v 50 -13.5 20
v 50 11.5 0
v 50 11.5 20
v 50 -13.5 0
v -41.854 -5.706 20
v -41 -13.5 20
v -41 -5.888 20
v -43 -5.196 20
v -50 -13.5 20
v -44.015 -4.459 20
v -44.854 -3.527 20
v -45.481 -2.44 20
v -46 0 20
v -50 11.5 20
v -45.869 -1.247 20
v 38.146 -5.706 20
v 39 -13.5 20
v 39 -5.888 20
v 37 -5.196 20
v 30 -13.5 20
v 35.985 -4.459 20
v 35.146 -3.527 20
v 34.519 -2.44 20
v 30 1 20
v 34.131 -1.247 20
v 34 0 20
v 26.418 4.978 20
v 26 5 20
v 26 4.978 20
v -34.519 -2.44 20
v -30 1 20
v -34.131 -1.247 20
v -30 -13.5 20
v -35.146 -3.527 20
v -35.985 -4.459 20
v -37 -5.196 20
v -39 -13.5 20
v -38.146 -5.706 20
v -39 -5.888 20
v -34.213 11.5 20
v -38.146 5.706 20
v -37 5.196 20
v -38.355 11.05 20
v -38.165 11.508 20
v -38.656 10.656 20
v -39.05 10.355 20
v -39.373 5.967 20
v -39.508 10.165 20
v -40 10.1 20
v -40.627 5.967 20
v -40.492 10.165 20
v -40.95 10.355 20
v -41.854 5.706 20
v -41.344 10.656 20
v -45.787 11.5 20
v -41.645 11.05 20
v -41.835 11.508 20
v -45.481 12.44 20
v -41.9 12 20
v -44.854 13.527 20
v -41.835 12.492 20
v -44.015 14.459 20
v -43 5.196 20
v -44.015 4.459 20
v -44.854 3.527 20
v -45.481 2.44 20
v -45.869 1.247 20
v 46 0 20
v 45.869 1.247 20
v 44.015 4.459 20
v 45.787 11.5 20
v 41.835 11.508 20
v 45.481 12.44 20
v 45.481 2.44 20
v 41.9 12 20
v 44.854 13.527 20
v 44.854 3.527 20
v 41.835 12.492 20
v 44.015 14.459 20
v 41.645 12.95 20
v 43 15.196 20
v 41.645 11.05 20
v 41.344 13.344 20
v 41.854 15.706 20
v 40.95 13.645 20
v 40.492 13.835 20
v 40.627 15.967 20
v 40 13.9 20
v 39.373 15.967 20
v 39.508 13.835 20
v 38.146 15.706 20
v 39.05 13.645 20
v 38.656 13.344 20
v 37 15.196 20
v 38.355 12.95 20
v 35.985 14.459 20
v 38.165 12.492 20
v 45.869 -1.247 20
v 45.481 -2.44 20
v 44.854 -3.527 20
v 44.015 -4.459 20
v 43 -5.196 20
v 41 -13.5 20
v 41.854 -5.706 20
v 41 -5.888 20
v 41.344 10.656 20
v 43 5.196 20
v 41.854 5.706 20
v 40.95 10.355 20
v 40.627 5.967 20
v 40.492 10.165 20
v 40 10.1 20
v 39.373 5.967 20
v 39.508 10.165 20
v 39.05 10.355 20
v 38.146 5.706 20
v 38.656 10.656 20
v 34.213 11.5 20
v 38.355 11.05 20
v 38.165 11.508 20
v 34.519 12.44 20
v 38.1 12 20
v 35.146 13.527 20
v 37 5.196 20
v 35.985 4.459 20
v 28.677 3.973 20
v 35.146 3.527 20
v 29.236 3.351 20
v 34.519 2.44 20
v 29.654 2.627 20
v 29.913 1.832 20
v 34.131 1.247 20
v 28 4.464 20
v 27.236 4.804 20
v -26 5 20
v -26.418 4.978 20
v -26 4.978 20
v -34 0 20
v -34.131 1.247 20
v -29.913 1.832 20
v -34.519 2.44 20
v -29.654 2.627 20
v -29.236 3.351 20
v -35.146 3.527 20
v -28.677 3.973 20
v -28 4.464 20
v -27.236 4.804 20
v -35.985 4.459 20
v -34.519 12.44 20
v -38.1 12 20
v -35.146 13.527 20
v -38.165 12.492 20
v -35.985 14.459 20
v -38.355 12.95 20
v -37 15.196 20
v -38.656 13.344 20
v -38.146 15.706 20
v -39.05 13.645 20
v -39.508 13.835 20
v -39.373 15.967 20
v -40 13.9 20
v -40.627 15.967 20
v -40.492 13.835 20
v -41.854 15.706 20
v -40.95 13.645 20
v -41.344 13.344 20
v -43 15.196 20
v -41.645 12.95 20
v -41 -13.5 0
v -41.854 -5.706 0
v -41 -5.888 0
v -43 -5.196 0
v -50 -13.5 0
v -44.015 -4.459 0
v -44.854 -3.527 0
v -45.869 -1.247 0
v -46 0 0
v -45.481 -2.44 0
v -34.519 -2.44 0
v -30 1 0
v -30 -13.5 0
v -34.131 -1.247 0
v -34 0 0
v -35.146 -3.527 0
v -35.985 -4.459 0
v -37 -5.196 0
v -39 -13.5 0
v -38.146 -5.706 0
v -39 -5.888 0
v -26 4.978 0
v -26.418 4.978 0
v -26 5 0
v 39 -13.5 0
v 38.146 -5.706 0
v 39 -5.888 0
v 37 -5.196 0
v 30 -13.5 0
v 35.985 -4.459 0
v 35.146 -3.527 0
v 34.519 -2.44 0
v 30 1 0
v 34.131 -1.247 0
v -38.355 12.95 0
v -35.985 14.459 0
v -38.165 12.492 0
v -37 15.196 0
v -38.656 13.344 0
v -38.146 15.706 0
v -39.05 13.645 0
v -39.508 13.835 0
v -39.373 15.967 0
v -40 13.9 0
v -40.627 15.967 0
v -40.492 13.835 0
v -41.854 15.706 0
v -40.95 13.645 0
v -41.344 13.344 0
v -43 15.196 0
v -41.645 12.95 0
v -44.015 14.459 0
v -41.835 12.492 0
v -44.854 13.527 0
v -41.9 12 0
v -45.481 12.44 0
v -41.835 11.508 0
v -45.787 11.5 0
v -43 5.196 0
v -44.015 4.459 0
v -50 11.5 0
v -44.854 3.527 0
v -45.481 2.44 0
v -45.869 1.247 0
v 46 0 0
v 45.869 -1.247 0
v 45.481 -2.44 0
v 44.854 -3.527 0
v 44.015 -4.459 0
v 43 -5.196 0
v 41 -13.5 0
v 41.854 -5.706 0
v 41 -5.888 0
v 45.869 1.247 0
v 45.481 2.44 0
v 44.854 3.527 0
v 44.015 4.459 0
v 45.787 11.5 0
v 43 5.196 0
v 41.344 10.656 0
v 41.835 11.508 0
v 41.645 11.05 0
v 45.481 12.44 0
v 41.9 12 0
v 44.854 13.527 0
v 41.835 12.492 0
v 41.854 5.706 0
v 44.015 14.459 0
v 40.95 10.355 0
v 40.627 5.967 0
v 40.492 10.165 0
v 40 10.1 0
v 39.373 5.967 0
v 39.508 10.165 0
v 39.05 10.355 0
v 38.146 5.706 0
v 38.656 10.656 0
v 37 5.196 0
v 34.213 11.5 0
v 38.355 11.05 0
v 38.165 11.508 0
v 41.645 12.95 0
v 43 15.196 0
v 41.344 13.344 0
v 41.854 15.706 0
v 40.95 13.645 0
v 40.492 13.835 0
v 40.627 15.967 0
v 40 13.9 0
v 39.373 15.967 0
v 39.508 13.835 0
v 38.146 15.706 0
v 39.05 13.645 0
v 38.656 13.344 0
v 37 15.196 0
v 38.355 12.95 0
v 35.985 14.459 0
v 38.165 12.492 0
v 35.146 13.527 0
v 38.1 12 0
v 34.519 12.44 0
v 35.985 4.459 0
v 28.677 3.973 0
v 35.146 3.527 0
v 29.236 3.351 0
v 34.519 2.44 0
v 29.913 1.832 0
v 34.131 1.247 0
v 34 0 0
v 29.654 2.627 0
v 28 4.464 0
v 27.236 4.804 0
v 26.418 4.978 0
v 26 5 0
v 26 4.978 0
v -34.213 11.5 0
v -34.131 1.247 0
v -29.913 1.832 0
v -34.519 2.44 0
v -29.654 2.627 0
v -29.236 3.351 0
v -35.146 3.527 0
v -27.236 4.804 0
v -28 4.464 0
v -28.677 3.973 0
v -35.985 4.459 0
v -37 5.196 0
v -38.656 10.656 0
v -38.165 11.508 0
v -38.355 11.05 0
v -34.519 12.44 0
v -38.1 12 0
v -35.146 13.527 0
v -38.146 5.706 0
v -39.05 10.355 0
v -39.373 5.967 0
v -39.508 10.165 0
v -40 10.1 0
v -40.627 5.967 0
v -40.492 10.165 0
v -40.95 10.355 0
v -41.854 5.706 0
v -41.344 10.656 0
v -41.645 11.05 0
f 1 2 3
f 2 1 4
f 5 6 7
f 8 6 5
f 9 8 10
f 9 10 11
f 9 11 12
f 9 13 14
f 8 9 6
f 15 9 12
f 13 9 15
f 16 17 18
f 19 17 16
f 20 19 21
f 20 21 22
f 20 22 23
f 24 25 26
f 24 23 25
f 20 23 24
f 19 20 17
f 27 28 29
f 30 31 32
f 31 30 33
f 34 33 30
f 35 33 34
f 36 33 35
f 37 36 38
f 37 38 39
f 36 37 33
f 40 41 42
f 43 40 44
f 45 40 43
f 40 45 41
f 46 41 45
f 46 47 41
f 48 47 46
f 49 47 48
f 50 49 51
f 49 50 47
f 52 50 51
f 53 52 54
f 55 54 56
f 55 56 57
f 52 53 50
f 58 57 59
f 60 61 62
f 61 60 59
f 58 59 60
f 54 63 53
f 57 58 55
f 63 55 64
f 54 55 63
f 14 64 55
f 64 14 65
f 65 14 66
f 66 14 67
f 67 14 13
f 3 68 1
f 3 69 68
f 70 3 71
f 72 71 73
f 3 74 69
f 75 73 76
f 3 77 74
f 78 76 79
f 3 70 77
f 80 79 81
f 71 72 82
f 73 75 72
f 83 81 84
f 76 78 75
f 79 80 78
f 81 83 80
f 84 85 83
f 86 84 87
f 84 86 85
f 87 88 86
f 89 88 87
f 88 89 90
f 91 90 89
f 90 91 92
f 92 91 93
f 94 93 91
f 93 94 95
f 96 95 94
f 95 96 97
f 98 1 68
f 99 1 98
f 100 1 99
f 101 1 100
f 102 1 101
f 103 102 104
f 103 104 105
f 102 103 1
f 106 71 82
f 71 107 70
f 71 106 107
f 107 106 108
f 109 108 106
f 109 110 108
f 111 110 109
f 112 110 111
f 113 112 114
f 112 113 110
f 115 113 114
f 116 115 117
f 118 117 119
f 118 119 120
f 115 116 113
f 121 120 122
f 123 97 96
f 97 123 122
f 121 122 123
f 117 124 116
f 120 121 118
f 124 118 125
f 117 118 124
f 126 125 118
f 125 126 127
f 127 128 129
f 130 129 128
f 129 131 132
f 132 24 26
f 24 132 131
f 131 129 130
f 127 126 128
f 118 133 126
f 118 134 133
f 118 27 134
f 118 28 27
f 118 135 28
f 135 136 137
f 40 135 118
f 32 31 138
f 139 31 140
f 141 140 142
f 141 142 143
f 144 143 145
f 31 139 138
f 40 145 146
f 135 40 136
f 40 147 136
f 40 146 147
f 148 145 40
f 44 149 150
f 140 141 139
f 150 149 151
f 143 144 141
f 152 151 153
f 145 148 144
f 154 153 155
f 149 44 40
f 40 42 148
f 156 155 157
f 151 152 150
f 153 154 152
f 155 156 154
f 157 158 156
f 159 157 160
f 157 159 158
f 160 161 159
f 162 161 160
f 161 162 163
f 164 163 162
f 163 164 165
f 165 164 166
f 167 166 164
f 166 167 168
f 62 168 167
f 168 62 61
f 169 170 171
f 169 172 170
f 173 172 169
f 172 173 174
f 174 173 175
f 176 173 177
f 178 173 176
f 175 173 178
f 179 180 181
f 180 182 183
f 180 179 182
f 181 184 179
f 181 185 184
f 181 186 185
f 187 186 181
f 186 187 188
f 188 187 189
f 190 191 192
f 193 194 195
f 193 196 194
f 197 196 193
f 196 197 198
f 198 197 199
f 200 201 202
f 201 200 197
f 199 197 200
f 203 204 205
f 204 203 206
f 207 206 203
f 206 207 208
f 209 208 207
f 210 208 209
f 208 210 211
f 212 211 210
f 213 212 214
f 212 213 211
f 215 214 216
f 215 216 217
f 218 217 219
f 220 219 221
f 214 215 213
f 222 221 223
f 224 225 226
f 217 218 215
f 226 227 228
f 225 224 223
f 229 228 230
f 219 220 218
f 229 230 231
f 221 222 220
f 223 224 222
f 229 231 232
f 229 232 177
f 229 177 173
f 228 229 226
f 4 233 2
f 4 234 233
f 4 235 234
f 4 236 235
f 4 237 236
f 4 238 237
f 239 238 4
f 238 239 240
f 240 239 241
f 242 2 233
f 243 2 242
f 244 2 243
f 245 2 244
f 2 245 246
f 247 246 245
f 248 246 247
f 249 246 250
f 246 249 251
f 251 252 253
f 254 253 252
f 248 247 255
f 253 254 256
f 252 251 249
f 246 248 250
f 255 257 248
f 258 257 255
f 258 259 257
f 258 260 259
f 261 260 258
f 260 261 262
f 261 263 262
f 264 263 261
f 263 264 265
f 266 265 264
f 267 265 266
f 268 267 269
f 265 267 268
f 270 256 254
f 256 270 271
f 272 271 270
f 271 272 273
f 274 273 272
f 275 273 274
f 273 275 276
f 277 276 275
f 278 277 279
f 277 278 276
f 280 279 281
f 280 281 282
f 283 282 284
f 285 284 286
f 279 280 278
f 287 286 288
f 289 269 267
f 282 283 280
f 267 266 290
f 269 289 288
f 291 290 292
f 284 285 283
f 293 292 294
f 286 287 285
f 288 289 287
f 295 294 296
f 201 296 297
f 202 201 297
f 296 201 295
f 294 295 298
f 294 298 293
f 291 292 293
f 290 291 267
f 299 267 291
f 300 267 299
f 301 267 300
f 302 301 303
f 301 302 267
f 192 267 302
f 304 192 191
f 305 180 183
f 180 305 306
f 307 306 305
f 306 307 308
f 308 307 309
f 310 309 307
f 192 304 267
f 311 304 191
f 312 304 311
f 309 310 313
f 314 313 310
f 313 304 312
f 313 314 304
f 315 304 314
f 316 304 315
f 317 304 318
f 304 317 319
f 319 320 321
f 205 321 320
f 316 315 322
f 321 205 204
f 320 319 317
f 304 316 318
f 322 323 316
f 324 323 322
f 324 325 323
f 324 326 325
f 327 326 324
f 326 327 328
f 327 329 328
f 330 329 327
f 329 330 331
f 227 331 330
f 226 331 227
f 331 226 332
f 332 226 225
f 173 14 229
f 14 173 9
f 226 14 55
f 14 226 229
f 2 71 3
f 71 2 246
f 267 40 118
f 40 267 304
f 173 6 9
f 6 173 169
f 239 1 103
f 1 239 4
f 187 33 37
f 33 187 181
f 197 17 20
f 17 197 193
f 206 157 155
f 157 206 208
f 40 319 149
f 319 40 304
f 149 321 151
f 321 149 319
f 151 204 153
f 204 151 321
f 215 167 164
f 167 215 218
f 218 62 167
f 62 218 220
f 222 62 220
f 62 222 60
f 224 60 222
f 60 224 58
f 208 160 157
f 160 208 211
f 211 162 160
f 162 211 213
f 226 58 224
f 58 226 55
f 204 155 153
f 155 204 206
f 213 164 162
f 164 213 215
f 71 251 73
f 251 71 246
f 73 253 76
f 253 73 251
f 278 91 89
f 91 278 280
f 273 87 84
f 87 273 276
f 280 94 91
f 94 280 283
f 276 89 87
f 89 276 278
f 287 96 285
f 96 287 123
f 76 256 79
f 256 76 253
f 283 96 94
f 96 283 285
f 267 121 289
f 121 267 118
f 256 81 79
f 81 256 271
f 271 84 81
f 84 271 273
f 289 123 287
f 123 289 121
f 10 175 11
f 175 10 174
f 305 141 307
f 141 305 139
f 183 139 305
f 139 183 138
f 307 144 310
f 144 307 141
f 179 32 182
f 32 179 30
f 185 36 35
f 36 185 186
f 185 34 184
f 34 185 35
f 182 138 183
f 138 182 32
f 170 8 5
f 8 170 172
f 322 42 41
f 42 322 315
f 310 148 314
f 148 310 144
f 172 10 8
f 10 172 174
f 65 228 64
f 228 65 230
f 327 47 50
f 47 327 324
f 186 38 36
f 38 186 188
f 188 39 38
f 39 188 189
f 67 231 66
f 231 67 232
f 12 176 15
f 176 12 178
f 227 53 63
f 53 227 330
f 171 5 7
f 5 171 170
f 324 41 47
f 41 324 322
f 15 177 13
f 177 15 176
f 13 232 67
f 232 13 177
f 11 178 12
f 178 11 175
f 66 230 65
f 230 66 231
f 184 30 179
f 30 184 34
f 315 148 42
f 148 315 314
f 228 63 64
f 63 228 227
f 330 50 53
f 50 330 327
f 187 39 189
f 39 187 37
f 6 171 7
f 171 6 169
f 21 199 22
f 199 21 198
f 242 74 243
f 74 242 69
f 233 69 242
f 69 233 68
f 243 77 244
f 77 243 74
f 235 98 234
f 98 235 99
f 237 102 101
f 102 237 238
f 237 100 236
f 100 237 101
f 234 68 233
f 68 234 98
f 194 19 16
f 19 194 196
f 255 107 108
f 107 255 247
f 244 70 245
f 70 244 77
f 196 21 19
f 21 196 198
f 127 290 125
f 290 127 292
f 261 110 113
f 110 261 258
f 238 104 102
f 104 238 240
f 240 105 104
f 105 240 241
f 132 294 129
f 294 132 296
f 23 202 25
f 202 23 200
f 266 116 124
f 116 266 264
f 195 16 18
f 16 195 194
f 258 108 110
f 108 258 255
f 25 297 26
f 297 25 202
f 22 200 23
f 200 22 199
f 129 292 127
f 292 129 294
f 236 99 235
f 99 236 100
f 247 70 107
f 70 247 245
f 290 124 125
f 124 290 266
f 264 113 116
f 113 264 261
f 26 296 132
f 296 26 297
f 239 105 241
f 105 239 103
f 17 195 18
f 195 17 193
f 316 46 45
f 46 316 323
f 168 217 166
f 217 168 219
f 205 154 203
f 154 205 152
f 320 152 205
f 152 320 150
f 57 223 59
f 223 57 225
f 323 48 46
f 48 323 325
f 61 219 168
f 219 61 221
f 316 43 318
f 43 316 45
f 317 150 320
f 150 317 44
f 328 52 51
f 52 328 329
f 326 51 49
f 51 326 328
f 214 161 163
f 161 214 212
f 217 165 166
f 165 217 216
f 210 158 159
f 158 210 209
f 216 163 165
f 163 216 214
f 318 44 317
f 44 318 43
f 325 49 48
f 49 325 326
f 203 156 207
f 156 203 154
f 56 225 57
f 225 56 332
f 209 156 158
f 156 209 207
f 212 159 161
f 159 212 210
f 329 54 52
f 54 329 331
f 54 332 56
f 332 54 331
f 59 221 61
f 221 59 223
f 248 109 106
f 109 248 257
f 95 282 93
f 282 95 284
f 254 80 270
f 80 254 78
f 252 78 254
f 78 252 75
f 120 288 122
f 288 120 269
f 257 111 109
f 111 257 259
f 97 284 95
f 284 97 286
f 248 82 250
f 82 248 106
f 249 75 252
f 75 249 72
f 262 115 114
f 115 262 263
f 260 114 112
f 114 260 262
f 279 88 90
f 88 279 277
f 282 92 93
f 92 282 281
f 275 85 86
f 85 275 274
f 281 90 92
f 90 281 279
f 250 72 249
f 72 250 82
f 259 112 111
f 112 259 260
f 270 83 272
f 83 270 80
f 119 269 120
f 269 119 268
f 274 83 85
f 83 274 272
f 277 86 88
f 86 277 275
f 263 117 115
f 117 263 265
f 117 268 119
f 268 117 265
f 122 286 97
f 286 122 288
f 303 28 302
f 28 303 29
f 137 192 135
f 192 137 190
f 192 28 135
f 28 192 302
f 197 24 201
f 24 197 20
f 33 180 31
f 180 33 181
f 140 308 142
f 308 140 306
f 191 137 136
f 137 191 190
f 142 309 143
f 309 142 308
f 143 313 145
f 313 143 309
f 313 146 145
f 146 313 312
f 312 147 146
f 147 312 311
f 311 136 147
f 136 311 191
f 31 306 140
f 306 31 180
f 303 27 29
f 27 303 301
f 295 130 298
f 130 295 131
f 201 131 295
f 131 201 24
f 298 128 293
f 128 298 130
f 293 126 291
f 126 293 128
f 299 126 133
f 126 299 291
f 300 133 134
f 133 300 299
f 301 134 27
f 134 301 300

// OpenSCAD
// file: configuration.scad
motor_end_height=50;
idler_end_height=28;
carriage_height=24;
platform_thickness=8;
bed_thickness=12;
pcb_thickness=2;
rod_length=200;
smooth_rod_length=1000;
smooth_rod_diameter=12;
smooth_rod_distance=80;
sandwich_smooth_rod_mounting_screw_distance=12;
tower_radius = 200;
platform_hinge_offset=33;
carriage_hinge_offset=22;
plywood_thickness=9;
// main file
include <configuration.scad>;

$fa = 12;
$fs = 0.5;

w = smooth_rod_distance; // Smooth rod distance (center to center)
belt_clearance_radius=4;

module screws() {
  for (x = [-w/2, w/2]) {
    translate([x, 0, 0]) {
      // Push-through M3 screw hole.
      translate([0, -smooth_rod_diameter/2-4, 0]) rotate([0, 90, 0])
	cylinder(r=2, h=20+2*smooth_rod_diameter, center=true);
      // M3 nut holder.
      //translate([-x/5, -6, 0])
	//rotate([30, 0, 0]) rotate([0, 90, 0])
	//cylinder(r=3.2, h=2.3, center=true, $fn=6);
    }
  }
}

module bracket(h) {
  difference() {
    union() {
      translate([0, -1, 0]) cube([w+smooth_rod_diameter*2-belt_clearance_radius, 25, h], center=true);
      // Sandwich mount.
      translate([-w/2, 10, 0]) cylinder(r=6, h=h, center=true);
      translate([w/2, 10, 0]) cylinder(r=6, h=h, center=true);
    }
    // Sandwich mount.
    translate([-w/2, sandwich_smooth_rod_mounting_screw_distance, 0]) cylinder(r=1.9, h=h+1, center=true);
    translate([w/2, sandwich_smooth_rod_mounting_screw_distance, 0]) cylinder(r=1.9, h=h+1, center=true);
    // Smooth rod mounting slots.
    for (x = [-w/2, w/2]) {
      translate([x, 0, 0]) {
			cylinder(r=smooth_rod_diameter/2, h=h+1, center=true);
			translate([0, -10, 0]) cube([2, 20, h+1], center=true);
      }
    }
    // Belt path.
    translate([0, -9+belt_clearance_radius, 0]) cube([w-2*smooth_rod_diameter-belt_clearance_radius, 20, h+1], center=true);
    translate([0, -9, 0]) cube([w-smooth_rod_diameter*2+belt_clearance_radius, 20, h+1], center=true);
    translate([-w/2+smooth_rod_diameter+belt_clearance_radius/2, 1, 0]) cylinder(r=belt_clearance_radius, h=h+1, center=true);
    translate([w/2-smooth_rod_diameter-belt_clearance_radius/2, 1, 0]) cylinder(r=belt_clearance_radius, h=h+1, center=true);
  }
}

translate([0, 0, 10]) bracket(20);
